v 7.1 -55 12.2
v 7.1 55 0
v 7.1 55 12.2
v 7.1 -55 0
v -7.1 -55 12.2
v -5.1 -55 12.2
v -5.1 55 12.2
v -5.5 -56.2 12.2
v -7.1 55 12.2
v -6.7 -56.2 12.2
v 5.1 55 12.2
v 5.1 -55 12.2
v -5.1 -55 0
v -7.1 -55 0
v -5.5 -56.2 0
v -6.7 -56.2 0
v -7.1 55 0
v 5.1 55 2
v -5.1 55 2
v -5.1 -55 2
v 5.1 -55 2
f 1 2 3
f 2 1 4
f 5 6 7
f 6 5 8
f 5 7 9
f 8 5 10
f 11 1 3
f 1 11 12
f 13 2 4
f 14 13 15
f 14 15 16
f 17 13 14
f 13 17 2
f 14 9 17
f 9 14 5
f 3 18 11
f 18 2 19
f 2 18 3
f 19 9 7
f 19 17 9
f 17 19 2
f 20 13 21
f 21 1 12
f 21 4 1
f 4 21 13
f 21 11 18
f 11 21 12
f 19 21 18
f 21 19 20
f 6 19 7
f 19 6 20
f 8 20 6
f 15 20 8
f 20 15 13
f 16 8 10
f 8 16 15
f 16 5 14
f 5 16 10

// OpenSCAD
/* ==========================================================================
   PROJETO CAMPO TÁTIL - CREMALHEIRA DE ENCAIXE EIXO X (PARA BARRA 10x10)
   Abraça a barra quadrada de 10x10mm da ponte e tem os dentes GT2 integrados
   ========================================================================== */

$fn = 60;

comprimento_ponte = 110;  // Comprimento útil da cremalheira
eixo_quadrado_w = 10.2;   // Encaixe justo na barra (10mm + 0.2mm)
parede = 2.0;             // Espessura da parede da canaleta

// Módulo para gerar dentes GT2 de 2.0mm de passo (voltados para a esquerda)
module dente_vertical_gt2_2mm(altura_dente=1.0, espessura_parede=2.0) {
    polygon(points=[
        [0, 0], 
        [0.4, -altura_dente], 
        [1.6, -altura_dente], 
        [2.0, 0],
        [2.0, espessura_parede],
        [0, espessura_parede]
    ]);
}

module cremalheira_x() {
    difference() {
        // 1. Corpo externo da canaleta (U de encaixe)
        translate([0, 0, (eixo_quadrado_w + parede)/2])
            cube([eixo_quadrado_w + parede*2, comprimento_ponte, eixo_quadrado_w + parede], center=true);
        
        // 2. Recorte interno quadrado de 10.2mm (Deixa a parte superior aberta para abraçar o metal)
        translate([0, 0, eixo_quadrado_w/2 + parede + 0.1])
            cube([eixo_quadrado_w, comprimento_ponte + 2, eixo_quadrado_w + 0.2], center=true);
    }
    
    // 3. Dentes da Cremalheira GT2 (Gerados ao longo da lateral esquerda -Y da canaleta)
    // O motor X vai andar mordendo essa trilha lateral
    translate([-eixo_quadrado_w/2 - parede, -comprimento_ponte/2, 0]) {
        linear_extrude(height=eixo_quadrado_w + parede) {
            union() {
                // Trilho base da parede de dentes
                translate([0, 0])
                    square([2.0, comprimento_ponte]);
                // Distribuição dos dentes GT2 passo 2.0mm
                for (y = [0 : 2.0 : comprimento_ponte - 2]) {
                    translate([0, y])
                        dente_vertical_gt2_2mm(altura_dente=1.2, espessura_parede=2.0);
                }
            }
        }
    }
}

cremalheira_x();
